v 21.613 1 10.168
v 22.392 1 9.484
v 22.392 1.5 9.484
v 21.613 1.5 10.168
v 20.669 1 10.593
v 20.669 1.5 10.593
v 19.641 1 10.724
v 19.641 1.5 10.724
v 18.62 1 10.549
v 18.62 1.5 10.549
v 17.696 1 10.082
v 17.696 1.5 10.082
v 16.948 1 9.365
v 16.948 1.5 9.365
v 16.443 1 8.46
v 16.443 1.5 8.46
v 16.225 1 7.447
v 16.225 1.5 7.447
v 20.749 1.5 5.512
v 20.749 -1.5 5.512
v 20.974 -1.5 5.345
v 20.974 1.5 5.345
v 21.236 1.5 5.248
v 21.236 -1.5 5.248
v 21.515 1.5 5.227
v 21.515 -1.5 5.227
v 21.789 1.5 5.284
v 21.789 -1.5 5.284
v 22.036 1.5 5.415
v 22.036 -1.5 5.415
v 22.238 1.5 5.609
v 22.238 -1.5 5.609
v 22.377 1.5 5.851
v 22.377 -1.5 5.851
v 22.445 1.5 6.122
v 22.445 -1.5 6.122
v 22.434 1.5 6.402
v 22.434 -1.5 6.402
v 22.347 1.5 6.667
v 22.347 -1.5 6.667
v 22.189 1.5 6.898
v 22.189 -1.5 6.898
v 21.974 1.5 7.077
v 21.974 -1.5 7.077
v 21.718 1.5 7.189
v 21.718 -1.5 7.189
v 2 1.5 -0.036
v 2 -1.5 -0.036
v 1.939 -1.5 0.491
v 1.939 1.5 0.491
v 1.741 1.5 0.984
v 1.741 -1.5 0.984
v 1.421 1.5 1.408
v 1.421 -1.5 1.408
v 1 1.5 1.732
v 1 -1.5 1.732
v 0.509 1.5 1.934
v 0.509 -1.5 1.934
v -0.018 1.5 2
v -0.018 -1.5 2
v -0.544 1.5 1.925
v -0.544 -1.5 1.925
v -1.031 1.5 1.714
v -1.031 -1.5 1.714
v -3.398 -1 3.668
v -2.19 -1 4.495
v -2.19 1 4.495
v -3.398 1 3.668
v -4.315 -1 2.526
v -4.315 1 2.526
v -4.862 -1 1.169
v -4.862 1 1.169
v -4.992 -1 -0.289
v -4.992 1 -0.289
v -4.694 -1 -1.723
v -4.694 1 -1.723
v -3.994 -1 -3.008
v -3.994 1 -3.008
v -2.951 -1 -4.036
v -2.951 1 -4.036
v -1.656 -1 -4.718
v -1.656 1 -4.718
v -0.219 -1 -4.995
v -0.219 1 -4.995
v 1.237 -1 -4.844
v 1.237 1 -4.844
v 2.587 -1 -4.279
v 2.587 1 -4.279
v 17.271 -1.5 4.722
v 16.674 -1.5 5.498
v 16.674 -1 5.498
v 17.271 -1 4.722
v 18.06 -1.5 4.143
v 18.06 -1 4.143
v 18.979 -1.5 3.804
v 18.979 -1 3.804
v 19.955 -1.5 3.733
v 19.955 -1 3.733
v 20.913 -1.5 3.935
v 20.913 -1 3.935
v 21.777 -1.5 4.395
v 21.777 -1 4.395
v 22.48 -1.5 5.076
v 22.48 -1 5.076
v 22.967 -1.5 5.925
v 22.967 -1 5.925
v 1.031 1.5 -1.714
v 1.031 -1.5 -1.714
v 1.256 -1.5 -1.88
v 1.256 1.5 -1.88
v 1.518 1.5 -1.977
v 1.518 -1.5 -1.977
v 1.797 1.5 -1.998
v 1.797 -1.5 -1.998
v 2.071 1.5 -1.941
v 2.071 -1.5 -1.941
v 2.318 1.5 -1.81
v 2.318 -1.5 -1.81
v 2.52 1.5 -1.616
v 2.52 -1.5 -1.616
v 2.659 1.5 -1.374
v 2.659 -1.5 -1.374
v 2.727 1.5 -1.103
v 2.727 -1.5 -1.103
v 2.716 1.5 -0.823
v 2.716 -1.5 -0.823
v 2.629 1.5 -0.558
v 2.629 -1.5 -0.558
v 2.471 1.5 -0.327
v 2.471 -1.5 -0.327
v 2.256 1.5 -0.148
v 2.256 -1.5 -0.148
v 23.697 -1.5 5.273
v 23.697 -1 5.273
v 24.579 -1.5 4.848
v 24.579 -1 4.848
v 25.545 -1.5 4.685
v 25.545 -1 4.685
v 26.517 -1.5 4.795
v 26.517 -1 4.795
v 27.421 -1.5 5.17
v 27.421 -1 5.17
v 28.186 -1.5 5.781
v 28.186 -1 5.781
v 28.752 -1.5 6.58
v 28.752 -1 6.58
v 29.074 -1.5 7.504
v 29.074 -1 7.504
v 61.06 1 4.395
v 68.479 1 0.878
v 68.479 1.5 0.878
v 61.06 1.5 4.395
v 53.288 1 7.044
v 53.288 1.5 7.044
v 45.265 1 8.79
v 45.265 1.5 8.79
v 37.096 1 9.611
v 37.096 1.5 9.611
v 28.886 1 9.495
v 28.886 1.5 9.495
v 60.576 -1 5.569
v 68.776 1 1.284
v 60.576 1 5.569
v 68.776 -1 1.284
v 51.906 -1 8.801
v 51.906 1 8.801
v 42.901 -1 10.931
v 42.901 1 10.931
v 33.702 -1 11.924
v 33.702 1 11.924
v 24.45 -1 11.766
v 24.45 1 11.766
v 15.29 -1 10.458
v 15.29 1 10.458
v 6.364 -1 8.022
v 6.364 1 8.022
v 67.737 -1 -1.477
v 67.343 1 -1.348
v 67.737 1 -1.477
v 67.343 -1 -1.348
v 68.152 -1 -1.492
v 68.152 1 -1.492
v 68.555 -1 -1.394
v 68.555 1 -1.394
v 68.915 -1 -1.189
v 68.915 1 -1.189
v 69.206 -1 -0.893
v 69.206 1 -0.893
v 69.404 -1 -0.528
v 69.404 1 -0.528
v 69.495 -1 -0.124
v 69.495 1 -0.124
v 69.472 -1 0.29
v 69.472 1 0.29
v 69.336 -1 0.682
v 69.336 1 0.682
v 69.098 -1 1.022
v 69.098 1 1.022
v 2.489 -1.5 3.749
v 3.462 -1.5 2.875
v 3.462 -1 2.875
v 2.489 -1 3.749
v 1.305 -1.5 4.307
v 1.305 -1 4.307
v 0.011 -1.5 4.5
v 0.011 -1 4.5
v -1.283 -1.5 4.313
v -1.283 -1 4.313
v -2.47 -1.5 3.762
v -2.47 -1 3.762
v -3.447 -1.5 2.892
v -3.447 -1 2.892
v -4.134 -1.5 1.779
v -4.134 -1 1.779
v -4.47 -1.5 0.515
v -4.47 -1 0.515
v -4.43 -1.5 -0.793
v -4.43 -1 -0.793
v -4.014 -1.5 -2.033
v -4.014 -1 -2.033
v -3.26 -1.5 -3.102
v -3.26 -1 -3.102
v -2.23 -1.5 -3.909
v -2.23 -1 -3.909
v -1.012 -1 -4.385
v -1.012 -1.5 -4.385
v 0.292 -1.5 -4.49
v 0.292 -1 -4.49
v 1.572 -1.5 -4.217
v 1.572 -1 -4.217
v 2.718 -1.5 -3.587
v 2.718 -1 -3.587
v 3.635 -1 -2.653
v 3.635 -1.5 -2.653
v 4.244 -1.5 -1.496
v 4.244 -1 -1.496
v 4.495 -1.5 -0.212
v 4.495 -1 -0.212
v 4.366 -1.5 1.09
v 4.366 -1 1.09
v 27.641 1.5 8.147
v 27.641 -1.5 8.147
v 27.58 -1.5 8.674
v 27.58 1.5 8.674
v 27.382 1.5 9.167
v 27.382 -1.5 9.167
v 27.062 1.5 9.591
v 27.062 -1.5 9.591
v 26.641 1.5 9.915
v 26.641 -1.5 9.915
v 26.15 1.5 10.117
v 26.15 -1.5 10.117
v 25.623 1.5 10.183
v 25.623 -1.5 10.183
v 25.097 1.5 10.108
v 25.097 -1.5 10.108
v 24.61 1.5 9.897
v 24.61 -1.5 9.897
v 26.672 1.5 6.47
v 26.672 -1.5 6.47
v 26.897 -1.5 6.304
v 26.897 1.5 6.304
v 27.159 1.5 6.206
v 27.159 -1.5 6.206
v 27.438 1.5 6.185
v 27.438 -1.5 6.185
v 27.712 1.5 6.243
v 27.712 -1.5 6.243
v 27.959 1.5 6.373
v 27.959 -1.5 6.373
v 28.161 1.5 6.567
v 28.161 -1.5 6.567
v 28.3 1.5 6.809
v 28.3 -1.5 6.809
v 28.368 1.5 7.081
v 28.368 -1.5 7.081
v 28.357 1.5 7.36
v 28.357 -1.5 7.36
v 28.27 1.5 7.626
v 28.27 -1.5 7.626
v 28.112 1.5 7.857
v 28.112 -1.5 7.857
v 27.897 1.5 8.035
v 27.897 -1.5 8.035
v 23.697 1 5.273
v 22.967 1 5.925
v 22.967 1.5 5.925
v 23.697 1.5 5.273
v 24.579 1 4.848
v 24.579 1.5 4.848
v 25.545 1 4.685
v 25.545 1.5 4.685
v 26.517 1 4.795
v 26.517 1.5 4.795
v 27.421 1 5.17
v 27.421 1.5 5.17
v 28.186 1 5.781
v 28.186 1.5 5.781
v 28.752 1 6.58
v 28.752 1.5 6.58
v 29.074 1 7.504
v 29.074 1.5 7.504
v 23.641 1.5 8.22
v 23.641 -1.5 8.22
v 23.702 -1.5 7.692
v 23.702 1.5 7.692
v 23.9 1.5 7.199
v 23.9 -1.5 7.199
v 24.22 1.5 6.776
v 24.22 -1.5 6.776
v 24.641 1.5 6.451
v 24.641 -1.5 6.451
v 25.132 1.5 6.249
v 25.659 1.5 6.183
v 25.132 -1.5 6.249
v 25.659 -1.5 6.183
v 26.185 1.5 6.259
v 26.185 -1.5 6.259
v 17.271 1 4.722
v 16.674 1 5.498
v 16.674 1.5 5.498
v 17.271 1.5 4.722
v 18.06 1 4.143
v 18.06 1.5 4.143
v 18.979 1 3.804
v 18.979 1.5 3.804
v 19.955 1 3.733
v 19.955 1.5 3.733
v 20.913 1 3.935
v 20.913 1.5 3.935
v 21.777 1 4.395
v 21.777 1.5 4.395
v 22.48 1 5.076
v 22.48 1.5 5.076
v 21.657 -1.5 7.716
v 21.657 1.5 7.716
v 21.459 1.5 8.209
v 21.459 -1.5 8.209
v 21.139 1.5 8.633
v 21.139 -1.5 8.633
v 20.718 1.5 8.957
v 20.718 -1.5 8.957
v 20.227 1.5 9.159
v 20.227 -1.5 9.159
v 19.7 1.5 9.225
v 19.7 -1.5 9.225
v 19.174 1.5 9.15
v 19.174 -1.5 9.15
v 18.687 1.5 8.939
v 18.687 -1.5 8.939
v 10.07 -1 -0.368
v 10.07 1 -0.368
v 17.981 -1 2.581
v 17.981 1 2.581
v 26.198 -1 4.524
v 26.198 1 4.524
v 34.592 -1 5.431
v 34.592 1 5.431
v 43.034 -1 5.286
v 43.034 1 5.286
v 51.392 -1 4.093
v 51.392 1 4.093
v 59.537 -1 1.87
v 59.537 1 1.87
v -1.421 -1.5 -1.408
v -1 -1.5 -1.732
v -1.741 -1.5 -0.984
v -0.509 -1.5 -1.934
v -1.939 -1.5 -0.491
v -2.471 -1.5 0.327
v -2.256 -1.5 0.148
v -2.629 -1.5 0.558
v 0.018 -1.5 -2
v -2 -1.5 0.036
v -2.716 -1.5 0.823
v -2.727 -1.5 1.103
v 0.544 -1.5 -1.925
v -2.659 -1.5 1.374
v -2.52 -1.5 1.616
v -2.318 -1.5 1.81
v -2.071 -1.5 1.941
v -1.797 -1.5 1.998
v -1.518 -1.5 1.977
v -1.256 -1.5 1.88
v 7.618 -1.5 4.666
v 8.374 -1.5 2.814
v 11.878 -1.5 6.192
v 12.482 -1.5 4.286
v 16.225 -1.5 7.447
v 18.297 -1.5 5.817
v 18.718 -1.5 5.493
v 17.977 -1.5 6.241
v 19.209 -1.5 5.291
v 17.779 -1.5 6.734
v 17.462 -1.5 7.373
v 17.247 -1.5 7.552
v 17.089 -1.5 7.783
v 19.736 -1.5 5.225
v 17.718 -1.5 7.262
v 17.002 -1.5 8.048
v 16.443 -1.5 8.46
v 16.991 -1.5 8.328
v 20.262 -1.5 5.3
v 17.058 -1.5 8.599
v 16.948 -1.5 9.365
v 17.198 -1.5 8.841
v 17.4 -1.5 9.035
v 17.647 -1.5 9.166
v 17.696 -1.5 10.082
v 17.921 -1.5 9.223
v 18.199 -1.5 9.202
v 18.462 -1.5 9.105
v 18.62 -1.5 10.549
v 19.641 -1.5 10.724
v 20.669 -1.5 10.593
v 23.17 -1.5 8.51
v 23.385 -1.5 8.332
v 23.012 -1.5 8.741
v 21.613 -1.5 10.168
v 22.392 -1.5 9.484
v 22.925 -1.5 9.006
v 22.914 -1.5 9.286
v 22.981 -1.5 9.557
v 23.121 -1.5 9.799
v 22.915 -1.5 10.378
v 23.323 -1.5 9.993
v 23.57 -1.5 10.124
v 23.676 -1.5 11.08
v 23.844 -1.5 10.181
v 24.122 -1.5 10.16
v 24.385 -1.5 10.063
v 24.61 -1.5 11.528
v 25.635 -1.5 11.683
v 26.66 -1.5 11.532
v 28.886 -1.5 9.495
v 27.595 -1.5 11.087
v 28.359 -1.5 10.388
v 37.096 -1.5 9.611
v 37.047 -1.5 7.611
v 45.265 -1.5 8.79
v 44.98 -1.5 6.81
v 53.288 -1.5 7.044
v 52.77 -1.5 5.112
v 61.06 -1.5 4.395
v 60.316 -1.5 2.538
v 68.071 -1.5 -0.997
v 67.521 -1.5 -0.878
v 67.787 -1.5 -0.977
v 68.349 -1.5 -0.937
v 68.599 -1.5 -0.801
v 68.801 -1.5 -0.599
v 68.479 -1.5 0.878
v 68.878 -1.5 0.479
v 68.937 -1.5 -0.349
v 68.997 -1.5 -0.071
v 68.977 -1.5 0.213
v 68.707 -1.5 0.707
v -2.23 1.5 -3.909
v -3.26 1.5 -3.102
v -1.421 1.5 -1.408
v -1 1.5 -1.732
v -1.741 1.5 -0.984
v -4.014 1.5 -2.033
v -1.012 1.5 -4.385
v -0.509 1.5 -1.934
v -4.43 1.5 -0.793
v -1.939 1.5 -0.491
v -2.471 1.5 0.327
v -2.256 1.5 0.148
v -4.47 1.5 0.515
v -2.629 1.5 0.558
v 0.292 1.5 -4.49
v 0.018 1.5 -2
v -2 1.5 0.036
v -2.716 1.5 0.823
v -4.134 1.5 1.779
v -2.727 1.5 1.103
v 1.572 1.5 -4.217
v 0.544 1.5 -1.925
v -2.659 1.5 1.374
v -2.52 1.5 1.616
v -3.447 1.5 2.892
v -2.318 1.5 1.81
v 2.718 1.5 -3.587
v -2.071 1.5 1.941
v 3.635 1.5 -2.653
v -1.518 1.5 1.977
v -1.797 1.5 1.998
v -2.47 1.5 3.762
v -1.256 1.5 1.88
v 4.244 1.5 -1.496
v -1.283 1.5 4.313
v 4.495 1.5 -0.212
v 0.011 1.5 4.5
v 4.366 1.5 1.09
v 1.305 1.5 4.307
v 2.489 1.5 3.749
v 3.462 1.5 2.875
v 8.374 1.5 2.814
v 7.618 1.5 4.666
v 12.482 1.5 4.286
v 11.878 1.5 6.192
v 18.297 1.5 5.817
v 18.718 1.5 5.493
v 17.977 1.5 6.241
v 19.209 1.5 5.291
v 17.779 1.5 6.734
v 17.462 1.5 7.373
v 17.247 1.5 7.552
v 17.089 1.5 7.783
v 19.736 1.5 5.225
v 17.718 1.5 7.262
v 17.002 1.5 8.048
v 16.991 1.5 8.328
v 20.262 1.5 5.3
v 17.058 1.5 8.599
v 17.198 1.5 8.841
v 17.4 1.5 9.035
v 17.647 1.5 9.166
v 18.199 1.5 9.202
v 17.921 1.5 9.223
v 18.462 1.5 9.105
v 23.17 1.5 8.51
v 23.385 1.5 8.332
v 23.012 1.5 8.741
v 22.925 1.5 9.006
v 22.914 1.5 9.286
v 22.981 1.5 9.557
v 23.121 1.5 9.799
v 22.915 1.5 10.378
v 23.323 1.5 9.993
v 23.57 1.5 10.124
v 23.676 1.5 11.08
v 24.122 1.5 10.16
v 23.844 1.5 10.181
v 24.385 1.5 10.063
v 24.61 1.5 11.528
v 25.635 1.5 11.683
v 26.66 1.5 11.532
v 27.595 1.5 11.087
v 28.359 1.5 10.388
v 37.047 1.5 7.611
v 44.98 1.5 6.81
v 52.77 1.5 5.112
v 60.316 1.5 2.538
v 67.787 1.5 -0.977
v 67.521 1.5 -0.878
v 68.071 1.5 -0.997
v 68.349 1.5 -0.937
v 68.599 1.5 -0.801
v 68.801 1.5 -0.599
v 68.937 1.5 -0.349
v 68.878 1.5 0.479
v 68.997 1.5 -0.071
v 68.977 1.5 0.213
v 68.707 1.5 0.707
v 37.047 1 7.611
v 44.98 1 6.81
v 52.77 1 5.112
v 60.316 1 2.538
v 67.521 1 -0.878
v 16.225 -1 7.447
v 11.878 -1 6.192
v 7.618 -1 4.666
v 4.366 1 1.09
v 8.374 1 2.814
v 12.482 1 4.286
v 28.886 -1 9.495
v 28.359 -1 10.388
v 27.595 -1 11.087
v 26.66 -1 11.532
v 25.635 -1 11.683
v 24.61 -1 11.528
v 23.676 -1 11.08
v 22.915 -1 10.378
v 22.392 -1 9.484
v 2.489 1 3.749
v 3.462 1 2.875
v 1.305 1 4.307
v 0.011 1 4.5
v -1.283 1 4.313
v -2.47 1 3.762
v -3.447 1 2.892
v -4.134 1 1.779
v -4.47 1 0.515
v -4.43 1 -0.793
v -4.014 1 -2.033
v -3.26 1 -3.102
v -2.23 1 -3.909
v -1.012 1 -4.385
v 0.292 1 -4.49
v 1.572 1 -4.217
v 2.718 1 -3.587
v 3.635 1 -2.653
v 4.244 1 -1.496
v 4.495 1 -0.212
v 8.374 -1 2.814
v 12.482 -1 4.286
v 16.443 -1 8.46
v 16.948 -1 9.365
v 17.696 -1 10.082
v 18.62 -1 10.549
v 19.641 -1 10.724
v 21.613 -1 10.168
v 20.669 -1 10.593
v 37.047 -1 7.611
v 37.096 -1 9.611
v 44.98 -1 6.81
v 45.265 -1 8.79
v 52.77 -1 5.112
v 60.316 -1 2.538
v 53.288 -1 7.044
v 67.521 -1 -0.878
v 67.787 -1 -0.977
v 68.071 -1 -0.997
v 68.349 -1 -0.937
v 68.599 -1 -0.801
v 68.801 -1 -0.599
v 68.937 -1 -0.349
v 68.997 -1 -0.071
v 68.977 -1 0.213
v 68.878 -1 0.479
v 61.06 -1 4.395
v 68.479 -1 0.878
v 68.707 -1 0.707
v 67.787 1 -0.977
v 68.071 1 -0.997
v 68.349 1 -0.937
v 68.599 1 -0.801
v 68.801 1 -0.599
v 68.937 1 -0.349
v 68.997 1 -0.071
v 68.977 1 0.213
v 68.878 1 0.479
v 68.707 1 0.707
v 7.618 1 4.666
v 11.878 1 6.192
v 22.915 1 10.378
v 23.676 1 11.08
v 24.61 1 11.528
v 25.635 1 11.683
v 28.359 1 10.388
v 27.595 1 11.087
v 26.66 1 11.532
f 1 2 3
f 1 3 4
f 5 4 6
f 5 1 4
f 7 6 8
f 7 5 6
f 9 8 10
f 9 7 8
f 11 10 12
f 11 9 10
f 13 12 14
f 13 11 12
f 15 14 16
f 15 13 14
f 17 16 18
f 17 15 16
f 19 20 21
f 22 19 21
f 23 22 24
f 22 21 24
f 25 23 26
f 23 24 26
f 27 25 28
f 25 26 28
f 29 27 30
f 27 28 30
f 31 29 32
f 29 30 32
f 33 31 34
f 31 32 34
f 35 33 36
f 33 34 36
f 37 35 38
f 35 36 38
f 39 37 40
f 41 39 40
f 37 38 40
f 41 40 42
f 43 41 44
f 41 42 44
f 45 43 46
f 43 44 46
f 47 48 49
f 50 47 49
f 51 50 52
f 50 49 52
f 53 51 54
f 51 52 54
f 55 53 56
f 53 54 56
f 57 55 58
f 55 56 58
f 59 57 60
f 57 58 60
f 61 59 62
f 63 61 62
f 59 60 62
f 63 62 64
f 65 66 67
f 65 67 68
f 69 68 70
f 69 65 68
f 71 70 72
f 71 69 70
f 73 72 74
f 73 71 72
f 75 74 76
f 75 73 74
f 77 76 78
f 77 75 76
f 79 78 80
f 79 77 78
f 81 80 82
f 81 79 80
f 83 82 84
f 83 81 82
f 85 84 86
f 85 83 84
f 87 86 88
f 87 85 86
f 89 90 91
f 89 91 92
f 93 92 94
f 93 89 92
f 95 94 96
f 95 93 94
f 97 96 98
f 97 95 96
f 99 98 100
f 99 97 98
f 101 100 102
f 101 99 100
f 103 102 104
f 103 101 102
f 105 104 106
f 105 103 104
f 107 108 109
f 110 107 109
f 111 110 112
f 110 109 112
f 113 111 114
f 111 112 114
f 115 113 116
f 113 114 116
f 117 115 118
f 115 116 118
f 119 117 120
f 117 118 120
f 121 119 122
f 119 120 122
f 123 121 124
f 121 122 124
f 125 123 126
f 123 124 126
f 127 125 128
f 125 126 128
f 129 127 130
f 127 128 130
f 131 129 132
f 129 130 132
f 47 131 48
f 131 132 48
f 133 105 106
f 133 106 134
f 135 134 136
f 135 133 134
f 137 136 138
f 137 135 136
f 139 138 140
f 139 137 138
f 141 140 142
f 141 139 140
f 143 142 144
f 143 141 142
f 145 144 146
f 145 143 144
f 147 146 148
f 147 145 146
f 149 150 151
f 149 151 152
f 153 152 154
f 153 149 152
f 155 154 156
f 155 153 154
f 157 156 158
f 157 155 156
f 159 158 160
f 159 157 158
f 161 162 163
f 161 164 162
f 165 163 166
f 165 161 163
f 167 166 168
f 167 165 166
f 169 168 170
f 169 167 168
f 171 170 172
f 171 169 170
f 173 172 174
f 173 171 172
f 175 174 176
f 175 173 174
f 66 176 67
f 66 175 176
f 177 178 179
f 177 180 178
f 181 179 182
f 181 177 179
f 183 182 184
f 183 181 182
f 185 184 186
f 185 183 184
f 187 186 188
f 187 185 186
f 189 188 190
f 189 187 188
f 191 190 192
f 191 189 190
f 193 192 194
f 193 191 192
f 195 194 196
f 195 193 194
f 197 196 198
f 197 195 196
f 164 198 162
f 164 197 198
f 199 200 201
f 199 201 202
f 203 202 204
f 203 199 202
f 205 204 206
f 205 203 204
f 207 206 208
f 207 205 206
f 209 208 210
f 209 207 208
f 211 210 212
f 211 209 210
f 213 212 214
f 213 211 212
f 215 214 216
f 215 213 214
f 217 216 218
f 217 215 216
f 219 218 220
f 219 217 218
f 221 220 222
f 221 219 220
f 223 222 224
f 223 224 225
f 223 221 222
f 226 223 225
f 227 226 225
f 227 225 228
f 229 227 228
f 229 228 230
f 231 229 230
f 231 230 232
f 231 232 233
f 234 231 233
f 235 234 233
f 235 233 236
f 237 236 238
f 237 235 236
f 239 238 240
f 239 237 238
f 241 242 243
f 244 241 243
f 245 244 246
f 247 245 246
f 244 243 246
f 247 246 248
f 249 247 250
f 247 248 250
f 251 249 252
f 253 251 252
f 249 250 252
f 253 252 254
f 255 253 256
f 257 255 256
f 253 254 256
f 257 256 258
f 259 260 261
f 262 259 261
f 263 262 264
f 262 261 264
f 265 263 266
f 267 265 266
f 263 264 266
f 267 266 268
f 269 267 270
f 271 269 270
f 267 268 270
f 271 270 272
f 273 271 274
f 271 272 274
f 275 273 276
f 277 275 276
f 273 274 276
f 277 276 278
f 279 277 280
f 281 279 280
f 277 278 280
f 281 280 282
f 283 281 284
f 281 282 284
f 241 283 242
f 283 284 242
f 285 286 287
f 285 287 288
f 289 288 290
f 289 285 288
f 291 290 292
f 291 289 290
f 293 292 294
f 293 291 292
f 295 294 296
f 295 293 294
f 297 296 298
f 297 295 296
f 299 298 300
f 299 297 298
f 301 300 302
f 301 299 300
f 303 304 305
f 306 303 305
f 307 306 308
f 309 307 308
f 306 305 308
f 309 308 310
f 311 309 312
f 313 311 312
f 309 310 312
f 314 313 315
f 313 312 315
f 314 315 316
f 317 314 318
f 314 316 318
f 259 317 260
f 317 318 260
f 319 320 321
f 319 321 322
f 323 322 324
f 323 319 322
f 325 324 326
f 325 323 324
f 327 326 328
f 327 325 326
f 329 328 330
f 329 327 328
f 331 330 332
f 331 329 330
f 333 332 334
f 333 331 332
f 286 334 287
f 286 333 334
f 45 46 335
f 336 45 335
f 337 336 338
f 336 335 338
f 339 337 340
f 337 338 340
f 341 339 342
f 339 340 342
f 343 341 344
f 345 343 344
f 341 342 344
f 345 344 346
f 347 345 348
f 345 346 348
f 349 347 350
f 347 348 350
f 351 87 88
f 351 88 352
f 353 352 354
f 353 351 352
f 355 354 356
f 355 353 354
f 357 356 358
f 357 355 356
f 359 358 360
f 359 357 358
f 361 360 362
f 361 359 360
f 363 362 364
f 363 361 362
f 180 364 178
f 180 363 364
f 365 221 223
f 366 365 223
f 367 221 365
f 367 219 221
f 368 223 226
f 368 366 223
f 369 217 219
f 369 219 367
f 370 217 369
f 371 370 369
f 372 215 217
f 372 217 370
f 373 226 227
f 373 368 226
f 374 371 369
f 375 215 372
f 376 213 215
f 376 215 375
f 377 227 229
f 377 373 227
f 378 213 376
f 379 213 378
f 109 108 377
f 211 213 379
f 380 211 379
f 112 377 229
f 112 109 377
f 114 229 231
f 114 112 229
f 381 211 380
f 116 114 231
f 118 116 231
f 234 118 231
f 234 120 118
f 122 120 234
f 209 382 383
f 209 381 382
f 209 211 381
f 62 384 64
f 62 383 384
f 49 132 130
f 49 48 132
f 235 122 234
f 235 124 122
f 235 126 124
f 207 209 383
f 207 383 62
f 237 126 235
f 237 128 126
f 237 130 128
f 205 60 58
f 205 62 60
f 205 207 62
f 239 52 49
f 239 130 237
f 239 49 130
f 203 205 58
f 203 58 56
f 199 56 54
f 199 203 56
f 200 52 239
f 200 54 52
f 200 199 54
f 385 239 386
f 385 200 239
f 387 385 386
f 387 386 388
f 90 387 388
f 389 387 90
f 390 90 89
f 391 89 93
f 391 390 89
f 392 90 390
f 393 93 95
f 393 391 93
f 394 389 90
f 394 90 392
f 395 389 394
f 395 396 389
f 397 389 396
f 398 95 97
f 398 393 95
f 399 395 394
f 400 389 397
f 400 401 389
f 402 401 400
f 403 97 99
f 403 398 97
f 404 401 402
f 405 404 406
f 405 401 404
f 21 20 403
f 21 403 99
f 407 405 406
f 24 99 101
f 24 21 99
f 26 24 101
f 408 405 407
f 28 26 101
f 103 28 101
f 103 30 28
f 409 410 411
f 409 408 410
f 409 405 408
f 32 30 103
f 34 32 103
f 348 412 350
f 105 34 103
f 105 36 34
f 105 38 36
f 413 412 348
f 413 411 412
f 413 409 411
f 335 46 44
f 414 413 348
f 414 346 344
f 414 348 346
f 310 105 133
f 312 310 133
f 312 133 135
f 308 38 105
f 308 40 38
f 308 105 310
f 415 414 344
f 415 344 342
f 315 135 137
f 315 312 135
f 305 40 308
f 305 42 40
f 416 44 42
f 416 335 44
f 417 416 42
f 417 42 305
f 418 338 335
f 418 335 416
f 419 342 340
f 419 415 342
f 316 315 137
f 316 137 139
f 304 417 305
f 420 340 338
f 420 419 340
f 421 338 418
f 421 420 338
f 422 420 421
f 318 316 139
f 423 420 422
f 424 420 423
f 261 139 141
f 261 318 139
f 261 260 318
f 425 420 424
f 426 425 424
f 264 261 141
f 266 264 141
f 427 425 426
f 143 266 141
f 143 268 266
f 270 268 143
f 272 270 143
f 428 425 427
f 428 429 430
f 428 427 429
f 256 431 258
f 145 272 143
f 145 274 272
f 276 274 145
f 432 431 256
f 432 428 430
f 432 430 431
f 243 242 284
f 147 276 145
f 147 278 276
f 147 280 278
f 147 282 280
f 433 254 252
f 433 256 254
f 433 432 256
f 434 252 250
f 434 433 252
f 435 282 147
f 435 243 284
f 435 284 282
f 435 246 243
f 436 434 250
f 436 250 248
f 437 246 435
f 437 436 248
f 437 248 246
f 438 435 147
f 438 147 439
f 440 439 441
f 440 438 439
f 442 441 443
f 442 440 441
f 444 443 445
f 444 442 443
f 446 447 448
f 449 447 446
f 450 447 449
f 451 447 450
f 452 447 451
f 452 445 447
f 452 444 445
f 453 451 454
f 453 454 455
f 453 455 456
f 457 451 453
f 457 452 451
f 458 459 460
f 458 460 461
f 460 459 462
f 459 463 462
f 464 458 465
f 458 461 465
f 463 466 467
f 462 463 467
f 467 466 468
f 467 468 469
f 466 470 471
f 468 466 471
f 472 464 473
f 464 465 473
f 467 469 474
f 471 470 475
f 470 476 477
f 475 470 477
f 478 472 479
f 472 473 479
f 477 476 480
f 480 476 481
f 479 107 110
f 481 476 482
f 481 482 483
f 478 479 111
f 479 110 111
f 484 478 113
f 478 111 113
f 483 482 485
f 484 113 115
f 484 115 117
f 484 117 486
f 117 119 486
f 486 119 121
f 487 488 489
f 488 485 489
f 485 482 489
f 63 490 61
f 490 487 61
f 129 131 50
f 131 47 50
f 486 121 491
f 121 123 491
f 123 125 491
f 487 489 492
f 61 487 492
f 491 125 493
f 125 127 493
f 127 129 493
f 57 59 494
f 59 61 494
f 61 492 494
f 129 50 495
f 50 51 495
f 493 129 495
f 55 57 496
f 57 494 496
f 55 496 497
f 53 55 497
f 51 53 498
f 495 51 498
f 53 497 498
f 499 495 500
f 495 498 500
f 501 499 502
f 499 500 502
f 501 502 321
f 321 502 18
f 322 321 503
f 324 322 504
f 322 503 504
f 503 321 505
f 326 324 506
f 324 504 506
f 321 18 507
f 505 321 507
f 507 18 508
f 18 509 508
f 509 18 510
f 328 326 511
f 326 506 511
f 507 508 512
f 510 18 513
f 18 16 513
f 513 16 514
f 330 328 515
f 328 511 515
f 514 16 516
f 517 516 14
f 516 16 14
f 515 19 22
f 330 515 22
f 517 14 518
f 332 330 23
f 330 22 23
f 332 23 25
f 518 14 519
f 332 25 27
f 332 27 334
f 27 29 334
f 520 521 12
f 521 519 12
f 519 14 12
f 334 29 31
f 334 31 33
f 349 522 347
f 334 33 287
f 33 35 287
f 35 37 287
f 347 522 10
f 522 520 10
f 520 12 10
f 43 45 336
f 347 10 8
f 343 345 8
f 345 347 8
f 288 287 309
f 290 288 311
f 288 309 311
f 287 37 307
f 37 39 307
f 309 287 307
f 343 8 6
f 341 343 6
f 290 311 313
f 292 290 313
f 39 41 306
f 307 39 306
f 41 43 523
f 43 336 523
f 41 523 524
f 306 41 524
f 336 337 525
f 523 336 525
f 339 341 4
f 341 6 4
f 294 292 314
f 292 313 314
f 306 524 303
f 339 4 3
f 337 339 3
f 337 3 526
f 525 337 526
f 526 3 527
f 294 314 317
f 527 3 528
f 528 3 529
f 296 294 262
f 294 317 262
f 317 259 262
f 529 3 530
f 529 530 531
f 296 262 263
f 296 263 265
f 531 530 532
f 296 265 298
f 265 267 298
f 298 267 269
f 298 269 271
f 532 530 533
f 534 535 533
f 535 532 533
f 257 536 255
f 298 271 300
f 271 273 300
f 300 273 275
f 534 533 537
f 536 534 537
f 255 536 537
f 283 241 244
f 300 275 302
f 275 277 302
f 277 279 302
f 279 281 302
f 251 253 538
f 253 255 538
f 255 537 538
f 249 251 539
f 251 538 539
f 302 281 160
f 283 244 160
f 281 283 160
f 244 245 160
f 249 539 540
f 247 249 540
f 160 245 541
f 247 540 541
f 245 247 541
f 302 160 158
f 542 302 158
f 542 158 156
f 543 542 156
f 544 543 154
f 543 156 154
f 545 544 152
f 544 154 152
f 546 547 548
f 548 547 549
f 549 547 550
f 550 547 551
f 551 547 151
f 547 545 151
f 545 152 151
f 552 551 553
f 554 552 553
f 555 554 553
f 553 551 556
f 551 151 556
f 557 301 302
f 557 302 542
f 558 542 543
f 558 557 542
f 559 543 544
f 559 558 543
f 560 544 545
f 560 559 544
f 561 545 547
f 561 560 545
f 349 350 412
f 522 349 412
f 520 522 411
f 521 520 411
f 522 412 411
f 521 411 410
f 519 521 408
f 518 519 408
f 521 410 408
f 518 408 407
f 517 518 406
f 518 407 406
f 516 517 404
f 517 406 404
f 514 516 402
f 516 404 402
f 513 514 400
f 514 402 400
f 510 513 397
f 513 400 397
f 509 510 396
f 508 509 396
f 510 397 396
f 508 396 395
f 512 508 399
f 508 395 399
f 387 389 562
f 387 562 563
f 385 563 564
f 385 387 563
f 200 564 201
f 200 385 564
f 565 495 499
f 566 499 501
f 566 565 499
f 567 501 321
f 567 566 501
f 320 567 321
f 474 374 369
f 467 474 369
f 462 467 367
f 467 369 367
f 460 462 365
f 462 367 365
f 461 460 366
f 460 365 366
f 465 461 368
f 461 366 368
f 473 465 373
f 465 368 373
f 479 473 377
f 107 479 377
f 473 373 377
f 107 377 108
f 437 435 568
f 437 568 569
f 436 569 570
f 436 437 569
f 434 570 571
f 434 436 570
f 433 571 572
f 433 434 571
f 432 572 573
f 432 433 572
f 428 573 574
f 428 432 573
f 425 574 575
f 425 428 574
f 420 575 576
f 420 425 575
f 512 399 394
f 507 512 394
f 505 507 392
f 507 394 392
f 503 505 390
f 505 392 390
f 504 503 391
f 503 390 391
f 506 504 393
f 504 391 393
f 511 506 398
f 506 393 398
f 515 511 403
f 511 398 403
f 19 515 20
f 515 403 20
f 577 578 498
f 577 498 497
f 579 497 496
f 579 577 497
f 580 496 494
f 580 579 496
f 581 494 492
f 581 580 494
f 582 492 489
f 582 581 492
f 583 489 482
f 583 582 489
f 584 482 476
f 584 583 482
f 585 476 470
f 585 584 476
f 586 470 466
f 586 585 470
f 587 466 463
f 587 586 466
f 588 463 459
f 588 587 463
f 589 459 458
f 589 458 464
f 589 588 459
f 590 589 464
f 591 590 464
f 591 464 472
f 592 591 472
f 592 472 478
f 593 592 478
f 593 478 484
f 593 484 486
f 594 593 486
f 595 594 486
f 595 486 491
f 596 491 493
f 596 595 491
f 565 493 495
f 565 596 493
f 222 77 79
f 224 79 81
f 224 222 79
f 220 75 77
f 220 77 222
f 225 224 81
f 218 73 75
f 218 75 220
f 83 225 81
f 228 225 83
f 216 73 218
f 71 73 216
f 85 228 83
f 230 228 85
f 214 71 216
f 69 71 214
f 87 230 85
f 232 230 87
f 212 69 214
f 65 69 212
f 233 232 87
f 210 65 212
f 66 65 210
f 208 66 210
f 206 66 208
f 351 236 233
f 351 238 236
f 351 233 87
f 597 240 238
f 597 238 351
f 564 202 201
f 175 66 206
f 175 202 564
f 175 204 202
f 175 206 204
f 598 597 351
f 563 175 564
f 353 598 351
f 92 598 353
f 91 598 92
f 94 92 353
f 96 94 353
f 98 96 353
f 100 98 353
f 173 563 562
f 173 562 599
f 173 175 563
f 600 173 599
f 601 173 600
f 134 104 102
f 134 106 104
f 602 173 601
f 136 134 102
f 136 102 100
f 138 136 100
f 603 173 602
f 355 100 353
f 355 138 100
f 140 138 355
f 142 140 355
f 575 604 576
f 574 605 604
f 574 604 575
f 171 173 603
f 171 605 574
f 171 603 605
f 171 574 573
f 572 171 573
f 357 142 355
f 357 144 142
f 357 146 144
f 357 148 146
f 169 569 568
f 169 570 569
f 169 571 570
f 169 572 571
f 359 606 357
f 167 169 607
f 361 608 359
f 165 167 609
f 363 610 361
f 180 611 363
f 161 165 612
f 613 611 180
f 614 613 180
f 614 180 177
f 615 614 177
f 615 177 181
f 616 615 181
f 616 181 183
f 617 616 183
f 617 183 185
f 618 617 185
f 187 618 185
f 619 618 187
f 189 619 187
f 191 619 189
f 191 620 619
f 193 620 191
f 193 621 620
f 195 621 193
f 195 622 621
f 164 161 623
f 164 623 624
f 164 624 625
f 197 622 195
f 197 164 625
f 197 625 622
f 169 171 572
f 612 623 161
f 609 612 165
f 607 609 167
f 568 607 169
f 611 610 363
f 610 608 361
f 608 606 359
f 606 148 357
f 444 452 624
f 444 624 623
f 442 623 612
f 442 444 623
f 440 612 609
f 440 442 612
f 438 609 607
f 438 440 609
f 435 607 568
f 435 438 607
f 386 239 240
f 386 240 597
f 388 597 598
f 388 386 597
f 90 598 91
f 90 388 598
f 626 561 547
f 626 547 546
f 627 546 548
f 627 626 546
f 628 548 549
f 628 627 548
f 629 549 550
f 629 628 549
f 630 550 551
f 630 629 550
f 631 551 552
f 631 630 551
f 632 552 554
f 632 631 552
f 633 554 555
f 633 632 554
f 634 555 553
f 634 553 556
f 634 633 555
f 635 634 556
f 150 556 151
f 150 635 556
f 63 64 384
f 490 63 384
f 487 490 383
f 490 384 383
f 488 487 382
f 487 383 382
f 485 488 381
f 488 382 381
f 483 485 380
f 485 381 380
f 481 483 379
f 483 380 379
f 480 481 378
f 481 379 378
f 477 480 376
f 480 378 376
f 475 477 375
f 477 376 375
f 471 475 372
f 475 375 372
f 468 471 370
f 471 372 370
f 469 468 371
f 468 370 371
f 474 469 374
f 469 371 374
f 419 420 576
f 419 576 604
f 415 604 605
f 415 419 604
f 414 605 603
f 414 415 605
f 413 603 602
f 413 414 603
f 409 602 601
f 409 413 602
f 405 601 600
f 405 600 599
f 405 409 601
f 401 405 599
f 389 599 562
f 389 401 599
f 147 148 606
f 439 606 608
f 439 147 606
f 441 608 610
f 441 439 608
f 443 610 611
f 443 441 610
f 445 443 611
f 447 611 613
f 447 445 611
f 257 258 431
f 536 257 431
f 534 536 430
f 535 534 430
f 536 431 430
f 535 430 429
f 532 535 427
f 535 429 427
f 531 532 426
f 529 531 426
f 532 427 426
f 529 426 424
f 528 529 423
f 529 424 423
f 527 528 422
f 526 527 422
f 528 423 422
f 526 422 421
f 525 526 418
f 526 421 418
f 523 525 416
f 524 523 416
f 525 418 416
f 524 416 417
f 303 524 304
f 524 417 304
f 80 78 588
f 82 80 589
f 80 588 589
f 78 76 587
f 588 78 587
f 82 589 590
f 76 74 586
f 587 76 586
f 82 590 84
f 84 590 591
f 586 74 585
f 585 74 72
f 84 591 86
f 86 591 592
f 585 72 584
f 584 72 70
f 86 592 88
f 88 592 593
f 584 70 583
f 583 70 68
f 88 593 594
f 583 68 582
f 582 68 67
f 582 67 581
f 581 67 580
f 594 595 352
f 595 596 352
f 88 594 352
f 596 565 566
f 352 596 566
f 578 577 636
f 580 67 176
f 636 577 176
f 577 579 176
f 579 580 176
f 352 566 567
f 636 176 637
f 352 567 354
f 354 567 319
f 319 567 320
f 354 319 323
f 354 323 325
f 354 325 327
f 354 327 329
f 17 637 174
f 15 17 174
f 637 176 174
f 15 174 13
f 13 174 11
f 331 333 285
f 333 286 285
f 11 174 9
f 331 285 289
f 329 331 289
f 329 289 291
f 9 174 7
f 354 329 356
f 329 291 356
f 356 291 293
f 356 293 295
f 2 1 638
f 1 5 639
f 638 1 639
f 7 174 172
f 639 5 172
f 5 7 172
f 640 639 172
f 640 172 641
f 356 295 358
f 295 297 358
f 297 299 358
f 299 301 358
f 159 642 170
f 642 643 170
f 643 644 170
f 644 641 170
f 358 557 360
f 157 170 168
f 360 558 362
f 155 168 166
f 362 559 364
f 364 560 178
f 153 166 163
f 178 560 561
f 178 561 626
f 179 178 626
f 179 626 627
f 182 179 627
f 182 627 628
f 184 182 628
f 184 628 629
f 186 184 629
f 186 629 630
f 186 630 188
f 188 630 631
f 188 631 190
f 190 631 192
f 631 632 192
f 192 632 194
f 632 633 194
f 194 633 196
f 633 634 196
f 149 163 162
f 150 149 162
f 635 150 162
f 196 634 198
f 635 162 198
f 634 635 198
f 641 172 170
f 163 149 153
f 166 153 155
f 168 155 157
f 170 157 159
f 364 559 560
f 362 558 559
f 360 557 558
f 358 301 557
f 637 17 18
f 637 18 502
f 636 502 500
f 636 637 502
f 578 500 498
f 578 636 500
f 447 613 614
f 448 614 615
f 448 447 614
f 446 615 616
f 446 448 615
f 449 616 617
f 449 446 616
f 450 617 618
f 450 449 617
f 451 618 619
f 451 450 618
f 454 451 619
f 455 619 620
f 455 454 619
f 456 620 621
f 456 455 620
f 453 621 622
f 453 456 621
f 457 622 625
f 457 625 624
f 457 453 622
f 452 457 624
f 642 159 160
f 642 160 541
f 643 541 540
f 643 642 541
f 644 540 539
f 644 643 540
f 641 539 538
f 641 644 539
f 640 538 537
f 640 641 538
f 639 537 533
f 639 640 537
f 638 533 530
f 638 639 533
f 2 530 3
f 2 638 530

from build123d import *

# Parameters (mm, degrees)
F1_DEPTH = 1
F3_DEPTH = 1.5
F5_DEPTH = 3.001


with BuildPart() as f1:
    # F0 (on Front) → F1 (new body, symmetric)
    with BuildSketch(Plane.XZ):
        with BuildLine():
            ThreePointArc((68.7761805926, 1.2835667835), (33.7017703575, 11.9240825949), (-2.1902850165, 4.4947359819))
            ThreePointArc((-2.1902850165, 4.4947359819), (-4.3911344557, -2.3912210671), (2.5872686419, -4.278555945))
            ThreePointArc((2.5872686419, -4.278555945), (34.592048198, 5.4307267094), (67.3429144951, -1.3484207946))
            ThreePointArc((67.3429144951, -1.3484207946), (69.3173403367, -0.7173663201), (68.7761805926, 1.2835667835))
        make_face()
    extrude(amount=F1_DEPTH, both=True)

    # F2 (on Front) → F3 (join, symmetric)
    with BuildSketch(Plane.XZ):
        with BuildLine():
            ThreePointArc((16.2250227063, 7.4472055889), (9.7355101111, 5.4623847447), (3.4618675547, 2.874973571))
            ThreePointArc((3.4618675547, 2.874973571), (-4.0144119209, -2.0333462394), (4.3660093294, 1.0899369411))
            ThreePointArc((4.3660093294, 1.0899369411), (10.4167772399, 3.581978337), (16.6739491432, 5.4976668288))
            ThreePointArc((16.6739491432, 5.4976668288), (19.9548297013, 3.7331037029), (22.9673717281, 5.9245531772))
            ThreePointArc((22.9673717281, 5.9245531772), (26.5172230695, 4.7947674828), (29.0743645644, 7.5038056215))
            ThreePointArc((29.0743645644, 7.5038056215), (48.8990908767, 6.0722634585), (67.5207768882, -0.8776931178))
            ThreePointArc((67.5207768882, -0.8776931178), (68.8776931178, -0.4792231118), (68.4792231118, 0.8776931178))
            ThreePointArc((68.4792231118, 0.8776931178), (49.3016635675, 8.0314710303), (28.8856869412, 9.495447426))
            ThreePointArc((28.8856869412, 9.495447426), (25.6346945373, 11.6832952033), (22.3915524813, 9.4838272879))
            ThreePointArc((22.3915524813, 9.4838272879), (18.6203358432, 10.5485124881), (16.2250227063, 7.4472055889))
        make_face()
    extrude(amount=F3_DEPTH, both=True)

    # F4 (on face) → F5 (cut, through all)
    with BuildSketch(Plane.XZ.offset(1.5)):
        with BuildLine():
            ThreePointArc((1.0314215383, -1.7135254916), (2.5980762114, -1.5), (1.9996673749, -0.0364745084))
            ThreePointArc((1.9996673749, -0.0364745084), (1, 1.7320508076), (-1.0314215383, 1.7135254916))
            ThreePointArc((-1.0314215383, 1.7135254916), (-2.5980762114, 1.5), (-1.9996673749, 0.0364745084))
            ThreePointArc((-1.9996673749, 0.0364745084), (-1, -1.7320508076), (1.0314215383, -1.7135254916))
        make_face()
        with BuildLine():
            ThreePointArc((20.7493885716, 5.5115541672), (22.3160432446, 5.7250796588), (21.7176344082, 7.1886051503))
            ThreePointArc((21.7176344082, 7.1886051503), (20.7179670333, 8.9571304663), (18.6865454949, 8.9386051503))
            ThreePointArc((18.6865454949, 8.9386051503), (17.1198908219, 8.7250796588), (17.7182996584, 7.2615541672))
            ThreePointArc((17.7182996584, 7.2615541672), (18.7179670333, 5.4930288512), (20.7493885716, 5.5115541672))
        make_face()
        with BuildLine():
            ThreePointArc((26.6723787145, 6.4697753147), (28.2390333875, 6.6833008063), (27.640624551, 8.1468262978))
            ThreePointArc((27.640624551, 8.1468262978), (26.6409571761, 9.9153516138), (24.6095356378, 9.8968262978))
            ThreePointArc((24.6095356378, 9.8968262978), (23.0428809648, 9.6833008063), (23.6412898012, 8.2197753147))
            ThreePointArc((23.6412898012, 8.2197753147), (24.6409571761, 6.4512499987), (26.6723787145, 6.4697753147))
        make_face()
    extrude(amount=-F5_DEPTH, mode=Mode.SUBTRACT)


solid = f1.part
